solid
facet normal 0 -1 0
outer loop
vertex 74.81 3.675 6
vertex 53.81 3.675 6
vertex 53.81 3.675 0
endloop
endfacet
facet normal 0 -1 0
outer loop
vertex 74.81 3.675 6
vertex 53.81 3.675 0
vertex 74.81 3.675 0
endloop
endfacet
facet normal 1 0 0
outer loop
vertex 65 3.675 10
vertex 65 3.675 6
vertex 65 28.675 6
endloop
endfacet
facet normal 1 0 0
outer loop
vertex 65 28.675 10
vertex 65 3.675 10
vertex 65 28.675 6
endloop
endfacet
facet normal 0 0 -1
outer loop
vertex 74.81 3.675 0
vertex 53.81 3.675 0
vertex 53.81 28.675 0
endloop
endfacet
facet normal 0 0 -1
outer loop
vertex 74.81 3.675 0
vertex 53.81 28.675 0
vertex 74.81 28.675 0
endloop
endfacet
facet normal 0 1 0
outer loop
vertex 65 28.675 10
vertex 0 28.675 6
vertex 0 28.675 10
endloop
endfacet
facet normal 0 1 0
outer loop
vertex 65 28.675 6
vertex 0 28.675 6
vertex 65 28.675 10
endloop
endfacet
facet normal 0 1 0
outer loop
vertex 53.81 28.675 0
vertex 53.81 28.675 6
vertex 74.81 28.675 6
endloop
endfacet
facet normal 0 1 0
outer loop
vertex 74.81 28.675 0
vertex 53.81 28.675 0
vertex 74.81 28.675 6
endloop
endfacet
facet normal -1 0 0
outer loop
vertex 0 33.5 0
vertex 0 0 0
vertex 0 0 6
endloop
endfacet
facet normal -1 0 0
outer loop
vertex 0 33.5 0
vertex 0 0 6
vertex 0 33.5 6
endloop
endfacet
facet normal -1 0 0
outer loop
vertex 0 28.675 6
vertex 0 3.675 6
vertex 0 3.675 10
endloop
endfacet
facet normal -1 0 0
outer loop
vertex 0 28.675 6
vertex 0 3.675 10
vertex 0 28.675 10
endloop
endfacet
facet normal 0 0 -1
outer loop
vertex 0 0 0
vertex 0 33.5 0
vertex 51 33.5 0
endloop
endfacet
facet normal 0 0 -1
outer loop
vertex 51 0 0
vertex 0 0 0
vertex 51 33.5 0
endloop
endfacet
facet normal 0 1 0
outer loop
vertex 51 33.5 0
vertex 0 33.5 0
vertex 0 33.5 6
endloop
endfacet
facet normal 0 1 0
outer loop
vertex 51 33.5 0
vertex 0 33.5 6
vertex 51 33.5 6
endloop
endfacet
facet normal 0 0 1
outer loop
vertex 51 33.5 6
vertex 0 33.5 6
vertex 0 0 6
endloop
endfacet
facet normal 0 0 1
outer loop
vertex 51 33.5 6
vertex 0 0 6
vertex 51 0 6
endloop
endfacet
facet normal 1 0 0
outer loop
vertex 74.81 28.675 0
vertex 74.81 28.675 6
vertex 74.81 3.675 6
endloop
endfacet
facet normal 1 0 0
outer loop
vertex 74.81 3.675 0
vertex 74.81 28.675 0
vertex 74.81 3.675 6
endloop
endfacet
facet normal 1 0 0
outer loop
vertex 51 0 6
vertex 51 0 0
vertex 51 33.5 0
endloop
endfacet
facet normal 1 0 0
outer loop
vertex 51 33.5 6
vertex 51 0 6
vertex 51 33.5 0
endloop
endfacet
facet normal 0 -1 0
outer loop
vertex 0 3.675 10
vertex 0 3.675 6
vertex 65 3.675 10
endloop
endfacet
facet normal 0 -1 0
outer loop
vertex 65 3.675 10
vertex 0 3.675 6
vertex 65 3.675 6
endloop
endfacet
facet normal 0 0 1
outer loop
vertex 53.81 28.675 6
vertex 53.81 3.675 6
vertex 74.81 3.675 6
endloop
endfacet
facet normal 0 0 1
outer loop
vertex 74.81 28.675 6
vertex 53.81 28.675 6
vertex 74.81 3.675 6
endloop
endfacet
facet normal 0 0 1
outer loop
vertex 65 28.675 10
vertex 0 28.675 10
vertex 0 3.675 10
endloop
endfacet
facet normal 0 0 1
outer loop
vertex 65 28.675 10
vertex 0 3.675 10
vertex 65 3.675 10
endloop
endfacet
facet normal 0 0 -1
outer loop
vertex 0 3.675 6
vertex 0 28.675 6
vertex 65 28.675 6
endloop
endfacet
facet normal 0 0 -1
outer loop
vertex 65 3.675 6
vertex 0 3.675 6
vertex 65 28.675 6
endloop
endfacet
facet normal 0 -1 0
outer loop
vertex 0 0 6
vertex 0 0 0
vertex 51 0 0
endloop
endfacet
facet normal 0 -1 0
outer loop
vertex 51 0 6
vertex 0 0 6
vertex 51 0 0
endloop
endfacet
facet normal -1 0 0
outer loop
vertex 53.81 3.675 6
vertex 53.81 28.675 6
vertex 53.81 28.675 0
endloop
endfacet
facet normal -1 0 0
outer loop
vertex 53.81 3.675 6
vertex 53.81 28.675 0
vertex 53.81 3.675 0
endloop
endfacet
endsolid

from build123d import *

# Parameters (mm, degrees)
F0_W     = 51
F0_H     = 33.5
F1_DEPTH = 6
F2_W     = 65
F2_H     = 25
F3_DEPTH = 4
F4_W     = 21
F4_H     = 25
F5_DEPTH = 6


# Not quite as in the source:
# - a feature names something its author has since deleted; it is built from what else it names


with BuildPart() as f1:
    # F0 (on Top) → F1 (new body)
    with BuildSketch(Plane.XY):
        with Locations((25.5, 16.75)):
            Rectangle(F0_W, F0_H)
    extrude(amount=F1_DEPTH)


with BuildPart() as f3:
    # F2 (on face) → F3 (new body)
    with BuildSketch(Plane.XY.offset(6)):
        with Locations((32.5, 16.1751881707)):
            Rectangle(F2_W, F2_H)
    extrude(amount=F3_DEPTH)


with BuildPart() as f5:
    # F4 (on face) → F5 (new body)
    with BuildSketch(Plane(origin=(0, 0, 6), x_dir=(1, 0, 0), z_dir=(0, 0, -1))):
        with Locations((64.3100422634, -16.1751881707)):
            Rectangle(F4_W, F4_H)
    extrude(amount=F5_DEPTH)


solid = Compound([f1.part, f3.part, f5.part])
